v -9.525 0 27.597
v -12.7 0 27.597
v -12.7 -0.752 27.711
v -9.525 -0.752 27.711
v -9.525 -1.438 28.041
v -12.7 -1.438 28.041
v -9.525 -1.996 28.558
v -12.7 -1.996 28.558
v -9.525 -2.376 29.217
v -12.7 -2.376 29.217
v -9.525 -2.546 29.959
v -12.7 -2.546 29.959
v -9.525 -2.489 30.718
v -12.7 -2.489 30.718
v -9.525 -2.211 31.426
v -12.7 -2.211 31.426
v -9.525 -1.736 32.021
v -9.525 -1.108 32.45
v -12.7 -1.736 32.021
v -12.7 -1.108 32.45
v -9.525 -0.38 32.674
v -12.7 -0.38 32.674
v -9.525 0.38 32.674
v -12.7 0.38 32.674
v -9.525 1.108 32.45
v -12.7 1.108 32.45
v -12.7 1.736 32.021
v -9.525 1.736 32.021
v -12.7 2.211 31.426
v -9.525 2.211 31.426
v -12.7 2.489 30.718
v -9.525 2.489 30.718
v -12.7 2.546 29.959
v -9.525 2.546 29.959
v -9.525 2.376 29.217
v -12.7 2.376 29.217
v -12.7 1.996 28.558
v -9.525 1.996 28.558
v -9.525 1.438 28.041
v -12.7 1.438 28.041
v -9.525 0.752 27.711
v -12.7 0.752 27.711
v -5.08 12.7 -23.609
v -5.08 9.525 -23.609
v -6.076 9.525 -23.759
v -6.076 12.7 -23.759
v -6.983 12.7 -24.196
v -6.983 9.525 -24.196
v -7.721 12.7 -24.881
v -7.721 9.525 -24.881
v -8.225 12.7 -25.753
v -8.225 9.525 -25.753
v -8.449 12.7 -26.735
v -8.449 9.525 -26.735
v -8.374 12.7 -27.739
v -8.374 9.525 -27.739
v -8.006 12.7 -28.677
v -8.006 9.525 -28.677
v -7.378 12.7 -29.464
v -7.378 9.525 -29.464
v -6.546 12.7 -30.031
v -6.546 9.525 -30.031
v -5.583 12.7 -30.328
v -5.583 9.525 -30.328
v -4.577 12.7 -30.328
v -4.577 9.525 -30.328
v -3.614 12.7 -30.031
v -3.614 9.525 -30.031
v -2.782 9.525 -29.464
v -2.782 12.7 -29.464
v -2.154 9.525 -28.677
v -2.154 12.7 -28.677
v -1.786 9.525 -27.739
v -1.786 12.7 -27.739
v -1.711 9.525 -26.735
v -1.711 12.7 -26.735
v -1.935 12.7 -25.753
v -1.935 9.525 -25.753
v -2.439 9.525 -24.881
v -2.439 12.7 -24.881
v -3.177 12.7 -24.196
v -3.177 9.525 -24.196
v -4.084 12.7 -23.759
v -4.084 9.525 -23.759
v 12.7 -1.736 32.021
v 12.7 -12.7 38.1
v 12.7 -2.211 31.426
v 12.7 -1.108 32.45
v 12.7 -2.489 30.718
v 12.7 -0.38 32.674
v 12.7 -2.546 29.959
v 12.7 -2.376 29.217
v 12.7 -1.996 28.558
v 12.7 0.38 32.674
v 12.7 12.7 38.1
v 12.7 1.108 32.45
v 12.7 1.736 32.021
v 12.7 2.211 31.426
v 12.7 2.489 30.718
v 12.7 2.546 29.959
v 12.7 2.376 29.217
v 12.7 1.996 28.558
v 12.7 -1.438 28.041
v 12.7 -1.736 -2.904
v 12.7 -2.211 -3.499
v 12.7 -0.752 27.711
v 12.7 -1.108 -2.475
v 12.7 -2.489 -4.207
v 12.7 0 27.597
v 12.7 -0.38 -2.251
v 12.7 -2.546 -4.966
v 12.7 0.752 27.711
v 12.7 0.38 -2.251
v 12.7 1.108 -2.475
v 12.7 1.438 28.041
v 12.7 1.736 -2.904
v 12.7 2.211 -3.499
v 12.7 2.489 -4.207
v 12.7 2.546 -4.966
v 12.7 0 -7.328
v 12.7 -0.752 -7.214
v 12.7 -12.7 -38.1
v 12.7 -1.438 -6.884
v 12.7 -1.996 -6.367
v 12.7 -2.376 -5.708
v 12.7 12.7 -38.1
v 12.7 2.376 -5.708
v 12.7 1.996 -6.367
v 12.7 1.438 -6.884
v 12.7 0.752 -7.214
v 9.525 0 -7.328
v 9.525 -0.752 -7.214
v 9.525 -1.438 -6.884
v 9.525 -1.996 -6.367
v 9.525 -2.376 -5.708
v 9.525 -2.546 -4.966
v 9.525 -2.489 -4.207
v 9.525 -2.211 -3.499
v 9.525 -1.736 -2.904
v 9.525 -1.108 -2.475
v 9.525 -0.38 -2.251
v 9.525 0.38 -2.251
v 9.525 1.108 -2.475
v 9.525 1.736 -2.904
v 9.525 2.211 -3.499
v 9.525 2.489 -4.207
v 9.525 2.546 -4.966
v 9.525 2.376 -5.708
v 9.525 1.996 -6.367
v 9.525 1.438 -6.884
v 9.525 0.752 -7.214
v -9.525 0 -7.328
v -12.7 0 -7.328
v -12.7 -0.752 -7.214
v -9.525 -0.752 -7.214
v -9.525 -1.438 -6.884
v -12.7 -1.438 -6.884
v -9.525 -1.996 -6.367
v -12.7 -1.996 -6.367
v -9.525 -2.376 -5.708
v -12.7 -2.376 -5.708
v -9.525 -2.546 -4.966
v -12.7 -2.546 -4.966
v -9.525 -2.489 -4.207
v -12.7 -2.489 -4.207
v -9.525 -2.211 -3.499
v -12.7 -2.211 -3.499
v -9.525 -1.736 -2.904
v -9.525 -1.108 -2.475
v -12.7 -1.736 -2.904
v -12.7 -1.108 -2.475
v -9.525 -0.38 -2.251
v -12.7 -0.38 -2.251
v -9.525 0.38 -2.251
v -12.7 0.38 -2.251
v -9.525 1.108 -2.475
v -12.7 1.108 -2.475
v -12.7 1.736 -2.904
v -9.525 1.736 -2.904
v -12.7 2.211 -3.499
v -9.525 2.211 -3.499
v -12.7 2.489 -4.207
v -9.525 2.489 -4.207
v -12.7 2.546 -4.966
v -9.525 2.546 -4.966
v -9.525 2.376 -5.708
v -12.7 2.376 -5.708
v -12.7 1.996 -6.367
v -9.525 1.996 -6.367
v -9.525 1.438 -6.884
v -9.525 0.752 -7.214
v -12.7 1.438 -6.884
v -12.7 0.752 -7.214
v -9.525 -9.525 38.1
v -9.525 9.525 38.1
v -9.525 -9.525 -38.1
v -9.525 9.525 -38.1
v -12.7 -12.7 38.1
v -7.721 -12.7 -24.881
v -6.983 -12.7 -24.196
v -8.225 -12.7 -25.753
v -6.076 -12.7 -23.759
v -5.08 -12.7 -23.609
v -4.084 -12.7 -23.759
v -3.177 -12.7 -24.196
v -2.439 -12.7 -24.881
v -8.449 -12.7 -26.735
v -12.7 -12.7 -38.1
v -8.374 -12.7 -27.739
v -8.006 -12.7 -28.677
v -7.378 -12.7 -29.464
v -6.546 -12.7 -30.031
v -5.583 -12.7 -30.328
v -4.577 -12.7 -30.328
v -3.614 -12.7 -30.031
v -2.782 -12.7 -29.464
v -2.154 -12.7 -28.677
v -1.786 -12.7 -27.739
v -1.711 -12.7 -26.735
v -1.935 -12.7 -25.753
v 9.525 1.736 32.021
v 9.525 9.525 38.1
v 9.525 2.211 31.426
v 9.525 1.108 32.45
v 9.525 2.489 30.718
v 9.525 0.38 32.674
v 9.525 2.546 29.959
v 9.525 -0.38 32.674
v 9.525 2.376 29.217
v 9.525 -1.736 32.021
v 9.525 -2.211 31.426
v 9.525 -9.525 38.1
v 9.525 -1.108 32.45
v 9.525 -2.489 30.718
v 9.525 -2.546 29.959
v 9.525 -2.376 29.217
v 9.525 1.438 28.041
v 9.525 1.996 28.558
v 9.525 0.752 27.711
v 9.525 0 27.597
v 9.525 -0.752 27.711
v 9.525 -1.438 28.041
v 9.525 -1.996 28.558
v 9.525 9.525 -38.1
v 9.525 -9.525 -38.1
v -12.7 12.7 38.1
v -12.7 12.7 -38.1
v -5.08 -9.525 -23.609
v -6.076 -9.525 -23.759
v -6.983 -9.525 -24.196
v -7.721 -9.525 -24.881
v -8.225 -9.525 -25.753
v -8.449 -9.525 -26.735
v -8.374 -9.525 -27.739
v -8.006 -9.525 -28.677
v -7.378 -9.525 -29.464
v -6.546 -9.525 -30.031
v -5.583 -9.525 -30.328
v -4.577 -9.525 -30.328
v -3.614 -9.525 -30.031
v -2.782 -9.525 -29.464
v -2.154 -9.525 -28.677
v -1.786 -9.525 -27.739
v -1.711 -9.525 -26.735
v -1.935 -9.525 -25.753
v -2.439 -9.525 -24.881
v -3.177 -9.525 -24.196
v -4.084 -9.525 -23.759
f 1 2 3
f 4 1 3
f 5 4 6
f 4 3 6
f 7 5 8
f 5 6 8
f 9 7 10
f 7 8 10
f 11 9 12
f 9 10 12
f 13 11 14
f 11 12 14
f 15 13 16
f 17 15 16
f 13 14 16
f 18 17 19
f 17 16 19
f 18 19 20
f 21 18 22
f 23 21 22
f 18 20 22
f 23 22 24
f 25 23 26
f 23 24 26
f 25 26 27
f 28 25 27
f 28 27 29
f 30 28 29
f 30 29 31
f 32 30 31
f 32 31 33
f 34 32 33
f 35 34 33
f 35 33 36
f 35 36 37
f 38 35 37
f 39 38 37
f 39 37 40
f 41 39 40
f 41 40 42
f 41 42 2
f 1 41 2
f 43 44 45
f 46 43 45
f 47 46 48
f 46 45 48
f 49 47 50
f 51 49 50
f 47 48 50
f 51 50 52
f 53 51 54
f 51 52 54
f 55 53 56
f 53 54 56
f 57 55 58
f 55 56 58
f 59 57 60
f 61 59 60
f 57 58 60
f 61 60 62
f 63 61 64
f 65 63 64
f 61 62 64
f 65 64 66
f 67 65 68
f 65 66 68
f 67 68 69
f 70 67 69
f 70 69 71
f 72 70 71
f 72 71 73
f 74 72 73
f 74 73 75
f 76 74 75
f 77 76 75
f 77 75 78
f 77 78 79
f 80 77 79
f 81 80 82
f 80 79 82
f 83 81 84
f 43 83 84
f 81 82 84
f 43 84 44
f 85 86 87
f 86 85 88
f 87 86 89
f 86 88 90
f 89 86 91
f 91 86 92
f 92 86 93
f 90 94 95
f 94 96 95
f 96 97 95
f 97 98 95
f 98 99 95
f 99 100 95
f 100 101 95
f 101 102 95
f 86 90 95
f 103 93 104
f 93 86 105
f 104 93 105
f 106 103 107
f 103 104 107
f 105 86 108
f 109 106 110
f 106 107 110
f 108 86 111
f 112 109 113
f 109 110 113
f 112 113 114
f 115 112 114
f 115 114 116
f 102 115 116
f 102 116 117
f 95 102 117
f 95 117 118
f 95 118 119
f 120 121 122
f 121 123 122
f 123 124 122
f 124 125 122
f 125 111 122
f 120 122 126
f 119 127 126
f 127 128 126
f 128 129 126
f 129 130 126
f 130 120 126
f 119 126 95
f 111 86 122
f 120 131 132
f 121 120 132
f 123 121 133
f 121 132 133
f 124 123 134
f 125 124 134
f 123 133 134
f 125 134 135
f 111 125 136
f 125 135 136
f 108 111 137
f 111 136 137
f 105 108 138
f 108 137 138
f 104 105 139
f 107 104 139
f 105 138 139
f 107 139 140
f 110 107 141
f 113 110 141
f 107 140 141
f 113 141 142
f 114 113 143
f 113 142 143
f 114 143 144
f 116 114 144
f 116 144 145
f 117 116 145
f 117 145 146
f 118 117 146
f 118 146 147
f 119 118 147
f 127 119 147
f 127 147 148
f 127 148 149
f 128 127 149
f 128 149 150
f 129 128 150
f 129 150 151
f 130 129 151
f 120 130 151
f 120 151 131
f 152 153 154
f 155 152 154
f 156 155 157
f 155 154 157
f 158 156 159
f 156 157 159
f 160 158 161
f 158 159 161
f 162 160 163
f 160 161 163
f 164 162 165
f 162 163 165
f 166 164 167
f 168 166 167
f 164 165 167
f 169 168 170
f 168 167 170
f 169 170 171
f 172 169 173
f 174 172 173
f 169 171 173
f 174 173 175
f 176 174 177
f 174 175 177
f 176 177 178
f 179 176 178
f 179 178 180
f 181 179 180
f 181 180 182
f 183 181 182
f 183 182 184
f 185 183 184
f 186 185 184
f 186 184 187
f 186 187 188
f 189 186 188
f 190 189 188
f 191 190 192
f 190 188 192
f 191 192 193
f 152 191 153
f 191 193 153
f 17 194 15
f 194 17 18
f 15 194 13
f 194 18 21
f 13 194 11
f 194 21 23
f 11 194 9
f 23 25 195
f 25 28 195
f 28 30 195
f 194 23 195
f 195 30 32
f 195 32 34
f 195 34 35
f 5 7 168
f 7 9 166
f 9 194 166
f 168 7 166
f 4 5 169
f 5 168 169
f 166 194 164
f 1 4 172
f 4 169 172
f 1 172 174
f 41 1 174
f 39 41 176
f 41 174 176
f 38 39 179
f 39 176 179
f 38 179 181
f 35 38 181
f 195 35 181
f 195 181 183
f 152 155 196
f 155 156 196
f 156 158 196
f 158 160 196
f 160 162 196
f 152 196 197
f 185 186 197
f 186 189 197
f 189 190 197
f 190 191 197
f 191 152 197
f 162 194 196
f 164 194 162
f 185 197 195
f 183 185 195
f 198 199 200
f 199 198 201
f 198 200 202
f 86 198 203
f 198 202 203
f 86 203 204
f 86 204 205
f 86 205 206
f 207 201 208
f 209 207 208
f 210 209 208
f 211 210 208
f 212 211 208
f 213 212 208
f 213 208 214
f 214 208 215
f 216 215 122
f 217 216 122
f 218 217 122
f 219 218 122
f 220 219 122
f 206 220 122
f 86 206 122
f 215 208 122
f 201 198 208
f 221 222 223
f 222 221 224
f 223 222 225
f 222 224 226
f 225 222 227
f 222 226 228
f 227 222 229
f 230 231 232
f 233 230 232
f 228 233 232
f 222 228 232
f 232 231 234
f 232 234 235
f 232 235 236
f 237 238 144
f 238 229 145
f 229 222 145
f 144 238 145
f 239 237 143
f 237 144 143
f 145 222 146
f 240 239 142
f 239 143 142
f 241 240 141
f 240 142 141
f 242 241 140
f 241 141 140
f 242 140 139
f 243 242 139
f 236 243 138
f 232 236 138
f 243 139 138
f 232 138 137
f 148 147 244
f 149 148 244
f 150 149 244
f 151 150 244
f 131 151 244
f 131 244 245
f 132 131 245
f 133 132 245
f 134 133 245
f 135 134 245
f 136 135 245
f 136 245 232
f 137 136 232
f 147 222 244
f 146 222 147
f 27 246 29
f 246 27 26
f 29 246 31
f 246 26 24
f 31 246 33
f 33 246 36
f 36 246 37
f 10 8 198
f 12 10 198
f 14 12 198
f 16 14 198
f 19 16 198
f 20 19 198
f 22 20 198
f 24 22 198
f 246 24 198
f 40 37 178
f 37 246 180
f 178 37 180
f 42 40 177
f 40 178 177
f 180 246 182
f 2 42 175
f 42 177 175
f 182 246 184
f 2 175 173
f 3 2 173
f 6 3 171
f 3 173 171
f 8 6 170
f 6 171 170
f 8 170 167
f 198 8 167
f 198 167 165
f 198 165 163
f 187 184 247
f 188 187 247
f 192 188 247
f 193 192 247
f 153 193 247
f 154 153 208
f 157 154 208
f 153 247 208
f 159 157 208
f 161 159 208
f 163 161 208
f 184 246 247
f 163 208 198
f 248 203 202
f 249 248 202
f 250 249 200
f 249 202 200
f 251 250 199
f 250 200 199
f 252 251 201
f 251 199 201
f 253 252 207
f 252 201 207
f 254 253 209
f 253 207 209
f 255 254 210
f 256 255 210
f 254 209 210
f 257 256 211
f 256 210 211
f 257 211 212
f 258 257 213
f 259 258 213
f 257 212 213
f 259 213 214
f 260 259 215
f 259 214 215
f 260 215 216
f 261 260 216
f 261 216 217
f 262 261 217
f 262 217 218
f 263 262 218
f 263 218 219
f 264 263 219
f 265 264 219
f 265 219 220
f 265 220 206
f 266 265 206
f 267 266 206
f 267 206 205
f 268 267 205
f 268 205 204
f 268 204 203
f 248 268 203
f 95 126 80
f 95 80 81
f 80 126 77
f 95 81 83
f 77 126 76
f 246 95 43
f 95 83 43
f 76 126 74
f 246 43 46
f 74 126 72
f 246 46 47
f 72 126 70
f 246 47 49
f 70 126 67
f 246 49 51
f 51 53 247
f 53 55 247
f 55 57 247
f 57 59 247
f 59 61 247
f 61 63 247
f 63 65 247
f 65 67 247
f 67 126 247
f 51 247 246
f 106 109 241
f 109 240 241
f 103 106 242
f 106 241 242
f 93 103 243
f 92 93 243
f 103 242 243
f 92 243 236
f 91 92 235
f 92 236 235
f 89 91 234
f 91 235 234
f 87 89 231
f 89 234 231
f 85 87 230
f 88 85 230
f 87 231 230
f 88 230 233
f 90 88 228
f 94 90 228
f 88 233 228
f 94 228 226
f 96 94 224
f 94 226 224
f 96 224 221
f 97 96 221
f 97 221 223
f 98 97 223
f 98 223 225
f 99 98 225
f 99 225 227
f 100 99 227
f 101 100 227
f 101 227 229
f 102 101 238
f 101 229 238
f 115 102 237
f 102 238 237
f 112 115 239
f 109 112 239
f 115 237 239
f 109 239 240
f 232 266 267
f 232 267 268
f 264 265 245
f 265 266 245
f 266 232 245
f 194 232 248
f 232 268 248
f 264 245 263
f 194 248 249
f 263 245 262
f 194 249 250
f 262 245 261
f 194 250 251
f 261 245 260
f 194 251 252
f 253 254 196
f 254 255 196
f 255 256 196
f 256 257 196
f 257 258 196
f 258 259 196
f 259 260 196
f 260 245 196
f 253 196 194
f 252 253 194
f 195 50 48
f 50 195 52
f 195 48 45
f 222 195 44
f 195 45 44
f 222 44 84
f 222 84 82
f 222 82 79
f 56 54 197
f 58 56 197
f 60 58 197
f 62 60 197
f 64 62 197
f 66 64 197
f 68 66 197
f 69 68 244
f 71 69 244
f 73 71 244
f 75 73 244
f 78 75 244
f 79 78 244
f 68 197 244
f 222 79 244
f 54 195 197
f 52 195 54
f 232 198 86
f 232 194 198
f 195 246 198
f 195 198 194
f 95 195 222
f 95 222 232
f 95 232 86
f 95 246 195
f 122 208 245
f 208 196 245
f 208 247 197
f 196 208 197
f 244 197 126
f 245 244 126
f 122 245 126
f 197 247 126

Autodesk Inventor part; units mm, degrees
ref_plane "YZ Plane" through (0, 0, 0) normal (1, 0, 0) x (0, 1, 0)
ref_plane "XZ Plane" through (0, 0, 0) normal (0, 1, 0) x (-1, 0, 0)
ref_plane "XY Plane" through (0, 0, 0) normal (0, 0, 1) x (1, 0, 0)
sketch "Sketch1" plane through (0, 0, 0) normal (0, 0, 1) x (1, 0, 0)
  line L0 (-12.7, -12.7) -> (12.7, -12.7)
  line L1 (12.7, -12.7) -> (12.7, 12.7)
  line L2 (12.7, 12.7) -> (-12.7, 12.7)
  line L3 (-12.7, 12.7) -> (-12.7, -12.7)
  line L4 (-12.7, -12.7) -> (12.7, 12.7) construction
  line L5 (12.7, -12.7) -> (-12.7, 12.7) construction
  line L6 (-9.525, 9.525) -> (9.525, 9.525)
  line L7 (9.525, 9.525) -> (9.525, -9.525)
  line L8 (9.525, -9.525) -> (-9.525, -9.525)
  line L9 (-9.525, -9.525) -> (-9.525, 9.525)
  point P0 (0, 0)
  dimension "width" = 25.4
  dimension "height" = 25.4
  dimension "thickness" = 3.175
extrude "Extrusion1" add sketch "Sketch1" along normal mid plane 76.2
sketch "Sketch3" plane through (12.7, -12.7, 38.1) normal (1, 0, 0) x (0, 0, -1)
  line L0 (7.9502, 12.7) -> (42.8752, 12.7) construction
  line L1 (0, 0) -> (0, 25.4) projected
  point P0 (25.4127, 12.7)
  point P1 (0, 12.7)
  dimension "d22" = 34.925
  dimension "d37" = 7.9502
hole "Hole2" at (12.7, 0, -4.7752) at (12.7, 0, 30.1498) direction (-1, 0, 0) diameter 5.1054 end through all clearance for "Flat Head Machine Screw (82)" size "#10" standard "Ansi Unified Screw Threads"
sketch "Sketch4" plane through (-12.7, 12.7, 38.1) normal (0, 1, 0) x (1, 0, 0)
  line L0 (0, 76.2) -> (25.4, 76.2) projected
  line L1 (0, 76.2) -> (0, 0) construction
  point P0 (12.7, 38.1)
  point P1 (7.62, 65.0875)
  dimension "d38" = 11.1125
  dimension "d39" = 7.62
hole "Hole3" at (-5.08, 12.7, -26.9875) direction (0, -1, 0) diameter 6.7564 end through all clearance for "Flat Head Machine Screw (82)" size "1/4" standard "Ansi Unified Screw Threads"
properties part number "EL2-S-004" material "Aluminum 6061"
